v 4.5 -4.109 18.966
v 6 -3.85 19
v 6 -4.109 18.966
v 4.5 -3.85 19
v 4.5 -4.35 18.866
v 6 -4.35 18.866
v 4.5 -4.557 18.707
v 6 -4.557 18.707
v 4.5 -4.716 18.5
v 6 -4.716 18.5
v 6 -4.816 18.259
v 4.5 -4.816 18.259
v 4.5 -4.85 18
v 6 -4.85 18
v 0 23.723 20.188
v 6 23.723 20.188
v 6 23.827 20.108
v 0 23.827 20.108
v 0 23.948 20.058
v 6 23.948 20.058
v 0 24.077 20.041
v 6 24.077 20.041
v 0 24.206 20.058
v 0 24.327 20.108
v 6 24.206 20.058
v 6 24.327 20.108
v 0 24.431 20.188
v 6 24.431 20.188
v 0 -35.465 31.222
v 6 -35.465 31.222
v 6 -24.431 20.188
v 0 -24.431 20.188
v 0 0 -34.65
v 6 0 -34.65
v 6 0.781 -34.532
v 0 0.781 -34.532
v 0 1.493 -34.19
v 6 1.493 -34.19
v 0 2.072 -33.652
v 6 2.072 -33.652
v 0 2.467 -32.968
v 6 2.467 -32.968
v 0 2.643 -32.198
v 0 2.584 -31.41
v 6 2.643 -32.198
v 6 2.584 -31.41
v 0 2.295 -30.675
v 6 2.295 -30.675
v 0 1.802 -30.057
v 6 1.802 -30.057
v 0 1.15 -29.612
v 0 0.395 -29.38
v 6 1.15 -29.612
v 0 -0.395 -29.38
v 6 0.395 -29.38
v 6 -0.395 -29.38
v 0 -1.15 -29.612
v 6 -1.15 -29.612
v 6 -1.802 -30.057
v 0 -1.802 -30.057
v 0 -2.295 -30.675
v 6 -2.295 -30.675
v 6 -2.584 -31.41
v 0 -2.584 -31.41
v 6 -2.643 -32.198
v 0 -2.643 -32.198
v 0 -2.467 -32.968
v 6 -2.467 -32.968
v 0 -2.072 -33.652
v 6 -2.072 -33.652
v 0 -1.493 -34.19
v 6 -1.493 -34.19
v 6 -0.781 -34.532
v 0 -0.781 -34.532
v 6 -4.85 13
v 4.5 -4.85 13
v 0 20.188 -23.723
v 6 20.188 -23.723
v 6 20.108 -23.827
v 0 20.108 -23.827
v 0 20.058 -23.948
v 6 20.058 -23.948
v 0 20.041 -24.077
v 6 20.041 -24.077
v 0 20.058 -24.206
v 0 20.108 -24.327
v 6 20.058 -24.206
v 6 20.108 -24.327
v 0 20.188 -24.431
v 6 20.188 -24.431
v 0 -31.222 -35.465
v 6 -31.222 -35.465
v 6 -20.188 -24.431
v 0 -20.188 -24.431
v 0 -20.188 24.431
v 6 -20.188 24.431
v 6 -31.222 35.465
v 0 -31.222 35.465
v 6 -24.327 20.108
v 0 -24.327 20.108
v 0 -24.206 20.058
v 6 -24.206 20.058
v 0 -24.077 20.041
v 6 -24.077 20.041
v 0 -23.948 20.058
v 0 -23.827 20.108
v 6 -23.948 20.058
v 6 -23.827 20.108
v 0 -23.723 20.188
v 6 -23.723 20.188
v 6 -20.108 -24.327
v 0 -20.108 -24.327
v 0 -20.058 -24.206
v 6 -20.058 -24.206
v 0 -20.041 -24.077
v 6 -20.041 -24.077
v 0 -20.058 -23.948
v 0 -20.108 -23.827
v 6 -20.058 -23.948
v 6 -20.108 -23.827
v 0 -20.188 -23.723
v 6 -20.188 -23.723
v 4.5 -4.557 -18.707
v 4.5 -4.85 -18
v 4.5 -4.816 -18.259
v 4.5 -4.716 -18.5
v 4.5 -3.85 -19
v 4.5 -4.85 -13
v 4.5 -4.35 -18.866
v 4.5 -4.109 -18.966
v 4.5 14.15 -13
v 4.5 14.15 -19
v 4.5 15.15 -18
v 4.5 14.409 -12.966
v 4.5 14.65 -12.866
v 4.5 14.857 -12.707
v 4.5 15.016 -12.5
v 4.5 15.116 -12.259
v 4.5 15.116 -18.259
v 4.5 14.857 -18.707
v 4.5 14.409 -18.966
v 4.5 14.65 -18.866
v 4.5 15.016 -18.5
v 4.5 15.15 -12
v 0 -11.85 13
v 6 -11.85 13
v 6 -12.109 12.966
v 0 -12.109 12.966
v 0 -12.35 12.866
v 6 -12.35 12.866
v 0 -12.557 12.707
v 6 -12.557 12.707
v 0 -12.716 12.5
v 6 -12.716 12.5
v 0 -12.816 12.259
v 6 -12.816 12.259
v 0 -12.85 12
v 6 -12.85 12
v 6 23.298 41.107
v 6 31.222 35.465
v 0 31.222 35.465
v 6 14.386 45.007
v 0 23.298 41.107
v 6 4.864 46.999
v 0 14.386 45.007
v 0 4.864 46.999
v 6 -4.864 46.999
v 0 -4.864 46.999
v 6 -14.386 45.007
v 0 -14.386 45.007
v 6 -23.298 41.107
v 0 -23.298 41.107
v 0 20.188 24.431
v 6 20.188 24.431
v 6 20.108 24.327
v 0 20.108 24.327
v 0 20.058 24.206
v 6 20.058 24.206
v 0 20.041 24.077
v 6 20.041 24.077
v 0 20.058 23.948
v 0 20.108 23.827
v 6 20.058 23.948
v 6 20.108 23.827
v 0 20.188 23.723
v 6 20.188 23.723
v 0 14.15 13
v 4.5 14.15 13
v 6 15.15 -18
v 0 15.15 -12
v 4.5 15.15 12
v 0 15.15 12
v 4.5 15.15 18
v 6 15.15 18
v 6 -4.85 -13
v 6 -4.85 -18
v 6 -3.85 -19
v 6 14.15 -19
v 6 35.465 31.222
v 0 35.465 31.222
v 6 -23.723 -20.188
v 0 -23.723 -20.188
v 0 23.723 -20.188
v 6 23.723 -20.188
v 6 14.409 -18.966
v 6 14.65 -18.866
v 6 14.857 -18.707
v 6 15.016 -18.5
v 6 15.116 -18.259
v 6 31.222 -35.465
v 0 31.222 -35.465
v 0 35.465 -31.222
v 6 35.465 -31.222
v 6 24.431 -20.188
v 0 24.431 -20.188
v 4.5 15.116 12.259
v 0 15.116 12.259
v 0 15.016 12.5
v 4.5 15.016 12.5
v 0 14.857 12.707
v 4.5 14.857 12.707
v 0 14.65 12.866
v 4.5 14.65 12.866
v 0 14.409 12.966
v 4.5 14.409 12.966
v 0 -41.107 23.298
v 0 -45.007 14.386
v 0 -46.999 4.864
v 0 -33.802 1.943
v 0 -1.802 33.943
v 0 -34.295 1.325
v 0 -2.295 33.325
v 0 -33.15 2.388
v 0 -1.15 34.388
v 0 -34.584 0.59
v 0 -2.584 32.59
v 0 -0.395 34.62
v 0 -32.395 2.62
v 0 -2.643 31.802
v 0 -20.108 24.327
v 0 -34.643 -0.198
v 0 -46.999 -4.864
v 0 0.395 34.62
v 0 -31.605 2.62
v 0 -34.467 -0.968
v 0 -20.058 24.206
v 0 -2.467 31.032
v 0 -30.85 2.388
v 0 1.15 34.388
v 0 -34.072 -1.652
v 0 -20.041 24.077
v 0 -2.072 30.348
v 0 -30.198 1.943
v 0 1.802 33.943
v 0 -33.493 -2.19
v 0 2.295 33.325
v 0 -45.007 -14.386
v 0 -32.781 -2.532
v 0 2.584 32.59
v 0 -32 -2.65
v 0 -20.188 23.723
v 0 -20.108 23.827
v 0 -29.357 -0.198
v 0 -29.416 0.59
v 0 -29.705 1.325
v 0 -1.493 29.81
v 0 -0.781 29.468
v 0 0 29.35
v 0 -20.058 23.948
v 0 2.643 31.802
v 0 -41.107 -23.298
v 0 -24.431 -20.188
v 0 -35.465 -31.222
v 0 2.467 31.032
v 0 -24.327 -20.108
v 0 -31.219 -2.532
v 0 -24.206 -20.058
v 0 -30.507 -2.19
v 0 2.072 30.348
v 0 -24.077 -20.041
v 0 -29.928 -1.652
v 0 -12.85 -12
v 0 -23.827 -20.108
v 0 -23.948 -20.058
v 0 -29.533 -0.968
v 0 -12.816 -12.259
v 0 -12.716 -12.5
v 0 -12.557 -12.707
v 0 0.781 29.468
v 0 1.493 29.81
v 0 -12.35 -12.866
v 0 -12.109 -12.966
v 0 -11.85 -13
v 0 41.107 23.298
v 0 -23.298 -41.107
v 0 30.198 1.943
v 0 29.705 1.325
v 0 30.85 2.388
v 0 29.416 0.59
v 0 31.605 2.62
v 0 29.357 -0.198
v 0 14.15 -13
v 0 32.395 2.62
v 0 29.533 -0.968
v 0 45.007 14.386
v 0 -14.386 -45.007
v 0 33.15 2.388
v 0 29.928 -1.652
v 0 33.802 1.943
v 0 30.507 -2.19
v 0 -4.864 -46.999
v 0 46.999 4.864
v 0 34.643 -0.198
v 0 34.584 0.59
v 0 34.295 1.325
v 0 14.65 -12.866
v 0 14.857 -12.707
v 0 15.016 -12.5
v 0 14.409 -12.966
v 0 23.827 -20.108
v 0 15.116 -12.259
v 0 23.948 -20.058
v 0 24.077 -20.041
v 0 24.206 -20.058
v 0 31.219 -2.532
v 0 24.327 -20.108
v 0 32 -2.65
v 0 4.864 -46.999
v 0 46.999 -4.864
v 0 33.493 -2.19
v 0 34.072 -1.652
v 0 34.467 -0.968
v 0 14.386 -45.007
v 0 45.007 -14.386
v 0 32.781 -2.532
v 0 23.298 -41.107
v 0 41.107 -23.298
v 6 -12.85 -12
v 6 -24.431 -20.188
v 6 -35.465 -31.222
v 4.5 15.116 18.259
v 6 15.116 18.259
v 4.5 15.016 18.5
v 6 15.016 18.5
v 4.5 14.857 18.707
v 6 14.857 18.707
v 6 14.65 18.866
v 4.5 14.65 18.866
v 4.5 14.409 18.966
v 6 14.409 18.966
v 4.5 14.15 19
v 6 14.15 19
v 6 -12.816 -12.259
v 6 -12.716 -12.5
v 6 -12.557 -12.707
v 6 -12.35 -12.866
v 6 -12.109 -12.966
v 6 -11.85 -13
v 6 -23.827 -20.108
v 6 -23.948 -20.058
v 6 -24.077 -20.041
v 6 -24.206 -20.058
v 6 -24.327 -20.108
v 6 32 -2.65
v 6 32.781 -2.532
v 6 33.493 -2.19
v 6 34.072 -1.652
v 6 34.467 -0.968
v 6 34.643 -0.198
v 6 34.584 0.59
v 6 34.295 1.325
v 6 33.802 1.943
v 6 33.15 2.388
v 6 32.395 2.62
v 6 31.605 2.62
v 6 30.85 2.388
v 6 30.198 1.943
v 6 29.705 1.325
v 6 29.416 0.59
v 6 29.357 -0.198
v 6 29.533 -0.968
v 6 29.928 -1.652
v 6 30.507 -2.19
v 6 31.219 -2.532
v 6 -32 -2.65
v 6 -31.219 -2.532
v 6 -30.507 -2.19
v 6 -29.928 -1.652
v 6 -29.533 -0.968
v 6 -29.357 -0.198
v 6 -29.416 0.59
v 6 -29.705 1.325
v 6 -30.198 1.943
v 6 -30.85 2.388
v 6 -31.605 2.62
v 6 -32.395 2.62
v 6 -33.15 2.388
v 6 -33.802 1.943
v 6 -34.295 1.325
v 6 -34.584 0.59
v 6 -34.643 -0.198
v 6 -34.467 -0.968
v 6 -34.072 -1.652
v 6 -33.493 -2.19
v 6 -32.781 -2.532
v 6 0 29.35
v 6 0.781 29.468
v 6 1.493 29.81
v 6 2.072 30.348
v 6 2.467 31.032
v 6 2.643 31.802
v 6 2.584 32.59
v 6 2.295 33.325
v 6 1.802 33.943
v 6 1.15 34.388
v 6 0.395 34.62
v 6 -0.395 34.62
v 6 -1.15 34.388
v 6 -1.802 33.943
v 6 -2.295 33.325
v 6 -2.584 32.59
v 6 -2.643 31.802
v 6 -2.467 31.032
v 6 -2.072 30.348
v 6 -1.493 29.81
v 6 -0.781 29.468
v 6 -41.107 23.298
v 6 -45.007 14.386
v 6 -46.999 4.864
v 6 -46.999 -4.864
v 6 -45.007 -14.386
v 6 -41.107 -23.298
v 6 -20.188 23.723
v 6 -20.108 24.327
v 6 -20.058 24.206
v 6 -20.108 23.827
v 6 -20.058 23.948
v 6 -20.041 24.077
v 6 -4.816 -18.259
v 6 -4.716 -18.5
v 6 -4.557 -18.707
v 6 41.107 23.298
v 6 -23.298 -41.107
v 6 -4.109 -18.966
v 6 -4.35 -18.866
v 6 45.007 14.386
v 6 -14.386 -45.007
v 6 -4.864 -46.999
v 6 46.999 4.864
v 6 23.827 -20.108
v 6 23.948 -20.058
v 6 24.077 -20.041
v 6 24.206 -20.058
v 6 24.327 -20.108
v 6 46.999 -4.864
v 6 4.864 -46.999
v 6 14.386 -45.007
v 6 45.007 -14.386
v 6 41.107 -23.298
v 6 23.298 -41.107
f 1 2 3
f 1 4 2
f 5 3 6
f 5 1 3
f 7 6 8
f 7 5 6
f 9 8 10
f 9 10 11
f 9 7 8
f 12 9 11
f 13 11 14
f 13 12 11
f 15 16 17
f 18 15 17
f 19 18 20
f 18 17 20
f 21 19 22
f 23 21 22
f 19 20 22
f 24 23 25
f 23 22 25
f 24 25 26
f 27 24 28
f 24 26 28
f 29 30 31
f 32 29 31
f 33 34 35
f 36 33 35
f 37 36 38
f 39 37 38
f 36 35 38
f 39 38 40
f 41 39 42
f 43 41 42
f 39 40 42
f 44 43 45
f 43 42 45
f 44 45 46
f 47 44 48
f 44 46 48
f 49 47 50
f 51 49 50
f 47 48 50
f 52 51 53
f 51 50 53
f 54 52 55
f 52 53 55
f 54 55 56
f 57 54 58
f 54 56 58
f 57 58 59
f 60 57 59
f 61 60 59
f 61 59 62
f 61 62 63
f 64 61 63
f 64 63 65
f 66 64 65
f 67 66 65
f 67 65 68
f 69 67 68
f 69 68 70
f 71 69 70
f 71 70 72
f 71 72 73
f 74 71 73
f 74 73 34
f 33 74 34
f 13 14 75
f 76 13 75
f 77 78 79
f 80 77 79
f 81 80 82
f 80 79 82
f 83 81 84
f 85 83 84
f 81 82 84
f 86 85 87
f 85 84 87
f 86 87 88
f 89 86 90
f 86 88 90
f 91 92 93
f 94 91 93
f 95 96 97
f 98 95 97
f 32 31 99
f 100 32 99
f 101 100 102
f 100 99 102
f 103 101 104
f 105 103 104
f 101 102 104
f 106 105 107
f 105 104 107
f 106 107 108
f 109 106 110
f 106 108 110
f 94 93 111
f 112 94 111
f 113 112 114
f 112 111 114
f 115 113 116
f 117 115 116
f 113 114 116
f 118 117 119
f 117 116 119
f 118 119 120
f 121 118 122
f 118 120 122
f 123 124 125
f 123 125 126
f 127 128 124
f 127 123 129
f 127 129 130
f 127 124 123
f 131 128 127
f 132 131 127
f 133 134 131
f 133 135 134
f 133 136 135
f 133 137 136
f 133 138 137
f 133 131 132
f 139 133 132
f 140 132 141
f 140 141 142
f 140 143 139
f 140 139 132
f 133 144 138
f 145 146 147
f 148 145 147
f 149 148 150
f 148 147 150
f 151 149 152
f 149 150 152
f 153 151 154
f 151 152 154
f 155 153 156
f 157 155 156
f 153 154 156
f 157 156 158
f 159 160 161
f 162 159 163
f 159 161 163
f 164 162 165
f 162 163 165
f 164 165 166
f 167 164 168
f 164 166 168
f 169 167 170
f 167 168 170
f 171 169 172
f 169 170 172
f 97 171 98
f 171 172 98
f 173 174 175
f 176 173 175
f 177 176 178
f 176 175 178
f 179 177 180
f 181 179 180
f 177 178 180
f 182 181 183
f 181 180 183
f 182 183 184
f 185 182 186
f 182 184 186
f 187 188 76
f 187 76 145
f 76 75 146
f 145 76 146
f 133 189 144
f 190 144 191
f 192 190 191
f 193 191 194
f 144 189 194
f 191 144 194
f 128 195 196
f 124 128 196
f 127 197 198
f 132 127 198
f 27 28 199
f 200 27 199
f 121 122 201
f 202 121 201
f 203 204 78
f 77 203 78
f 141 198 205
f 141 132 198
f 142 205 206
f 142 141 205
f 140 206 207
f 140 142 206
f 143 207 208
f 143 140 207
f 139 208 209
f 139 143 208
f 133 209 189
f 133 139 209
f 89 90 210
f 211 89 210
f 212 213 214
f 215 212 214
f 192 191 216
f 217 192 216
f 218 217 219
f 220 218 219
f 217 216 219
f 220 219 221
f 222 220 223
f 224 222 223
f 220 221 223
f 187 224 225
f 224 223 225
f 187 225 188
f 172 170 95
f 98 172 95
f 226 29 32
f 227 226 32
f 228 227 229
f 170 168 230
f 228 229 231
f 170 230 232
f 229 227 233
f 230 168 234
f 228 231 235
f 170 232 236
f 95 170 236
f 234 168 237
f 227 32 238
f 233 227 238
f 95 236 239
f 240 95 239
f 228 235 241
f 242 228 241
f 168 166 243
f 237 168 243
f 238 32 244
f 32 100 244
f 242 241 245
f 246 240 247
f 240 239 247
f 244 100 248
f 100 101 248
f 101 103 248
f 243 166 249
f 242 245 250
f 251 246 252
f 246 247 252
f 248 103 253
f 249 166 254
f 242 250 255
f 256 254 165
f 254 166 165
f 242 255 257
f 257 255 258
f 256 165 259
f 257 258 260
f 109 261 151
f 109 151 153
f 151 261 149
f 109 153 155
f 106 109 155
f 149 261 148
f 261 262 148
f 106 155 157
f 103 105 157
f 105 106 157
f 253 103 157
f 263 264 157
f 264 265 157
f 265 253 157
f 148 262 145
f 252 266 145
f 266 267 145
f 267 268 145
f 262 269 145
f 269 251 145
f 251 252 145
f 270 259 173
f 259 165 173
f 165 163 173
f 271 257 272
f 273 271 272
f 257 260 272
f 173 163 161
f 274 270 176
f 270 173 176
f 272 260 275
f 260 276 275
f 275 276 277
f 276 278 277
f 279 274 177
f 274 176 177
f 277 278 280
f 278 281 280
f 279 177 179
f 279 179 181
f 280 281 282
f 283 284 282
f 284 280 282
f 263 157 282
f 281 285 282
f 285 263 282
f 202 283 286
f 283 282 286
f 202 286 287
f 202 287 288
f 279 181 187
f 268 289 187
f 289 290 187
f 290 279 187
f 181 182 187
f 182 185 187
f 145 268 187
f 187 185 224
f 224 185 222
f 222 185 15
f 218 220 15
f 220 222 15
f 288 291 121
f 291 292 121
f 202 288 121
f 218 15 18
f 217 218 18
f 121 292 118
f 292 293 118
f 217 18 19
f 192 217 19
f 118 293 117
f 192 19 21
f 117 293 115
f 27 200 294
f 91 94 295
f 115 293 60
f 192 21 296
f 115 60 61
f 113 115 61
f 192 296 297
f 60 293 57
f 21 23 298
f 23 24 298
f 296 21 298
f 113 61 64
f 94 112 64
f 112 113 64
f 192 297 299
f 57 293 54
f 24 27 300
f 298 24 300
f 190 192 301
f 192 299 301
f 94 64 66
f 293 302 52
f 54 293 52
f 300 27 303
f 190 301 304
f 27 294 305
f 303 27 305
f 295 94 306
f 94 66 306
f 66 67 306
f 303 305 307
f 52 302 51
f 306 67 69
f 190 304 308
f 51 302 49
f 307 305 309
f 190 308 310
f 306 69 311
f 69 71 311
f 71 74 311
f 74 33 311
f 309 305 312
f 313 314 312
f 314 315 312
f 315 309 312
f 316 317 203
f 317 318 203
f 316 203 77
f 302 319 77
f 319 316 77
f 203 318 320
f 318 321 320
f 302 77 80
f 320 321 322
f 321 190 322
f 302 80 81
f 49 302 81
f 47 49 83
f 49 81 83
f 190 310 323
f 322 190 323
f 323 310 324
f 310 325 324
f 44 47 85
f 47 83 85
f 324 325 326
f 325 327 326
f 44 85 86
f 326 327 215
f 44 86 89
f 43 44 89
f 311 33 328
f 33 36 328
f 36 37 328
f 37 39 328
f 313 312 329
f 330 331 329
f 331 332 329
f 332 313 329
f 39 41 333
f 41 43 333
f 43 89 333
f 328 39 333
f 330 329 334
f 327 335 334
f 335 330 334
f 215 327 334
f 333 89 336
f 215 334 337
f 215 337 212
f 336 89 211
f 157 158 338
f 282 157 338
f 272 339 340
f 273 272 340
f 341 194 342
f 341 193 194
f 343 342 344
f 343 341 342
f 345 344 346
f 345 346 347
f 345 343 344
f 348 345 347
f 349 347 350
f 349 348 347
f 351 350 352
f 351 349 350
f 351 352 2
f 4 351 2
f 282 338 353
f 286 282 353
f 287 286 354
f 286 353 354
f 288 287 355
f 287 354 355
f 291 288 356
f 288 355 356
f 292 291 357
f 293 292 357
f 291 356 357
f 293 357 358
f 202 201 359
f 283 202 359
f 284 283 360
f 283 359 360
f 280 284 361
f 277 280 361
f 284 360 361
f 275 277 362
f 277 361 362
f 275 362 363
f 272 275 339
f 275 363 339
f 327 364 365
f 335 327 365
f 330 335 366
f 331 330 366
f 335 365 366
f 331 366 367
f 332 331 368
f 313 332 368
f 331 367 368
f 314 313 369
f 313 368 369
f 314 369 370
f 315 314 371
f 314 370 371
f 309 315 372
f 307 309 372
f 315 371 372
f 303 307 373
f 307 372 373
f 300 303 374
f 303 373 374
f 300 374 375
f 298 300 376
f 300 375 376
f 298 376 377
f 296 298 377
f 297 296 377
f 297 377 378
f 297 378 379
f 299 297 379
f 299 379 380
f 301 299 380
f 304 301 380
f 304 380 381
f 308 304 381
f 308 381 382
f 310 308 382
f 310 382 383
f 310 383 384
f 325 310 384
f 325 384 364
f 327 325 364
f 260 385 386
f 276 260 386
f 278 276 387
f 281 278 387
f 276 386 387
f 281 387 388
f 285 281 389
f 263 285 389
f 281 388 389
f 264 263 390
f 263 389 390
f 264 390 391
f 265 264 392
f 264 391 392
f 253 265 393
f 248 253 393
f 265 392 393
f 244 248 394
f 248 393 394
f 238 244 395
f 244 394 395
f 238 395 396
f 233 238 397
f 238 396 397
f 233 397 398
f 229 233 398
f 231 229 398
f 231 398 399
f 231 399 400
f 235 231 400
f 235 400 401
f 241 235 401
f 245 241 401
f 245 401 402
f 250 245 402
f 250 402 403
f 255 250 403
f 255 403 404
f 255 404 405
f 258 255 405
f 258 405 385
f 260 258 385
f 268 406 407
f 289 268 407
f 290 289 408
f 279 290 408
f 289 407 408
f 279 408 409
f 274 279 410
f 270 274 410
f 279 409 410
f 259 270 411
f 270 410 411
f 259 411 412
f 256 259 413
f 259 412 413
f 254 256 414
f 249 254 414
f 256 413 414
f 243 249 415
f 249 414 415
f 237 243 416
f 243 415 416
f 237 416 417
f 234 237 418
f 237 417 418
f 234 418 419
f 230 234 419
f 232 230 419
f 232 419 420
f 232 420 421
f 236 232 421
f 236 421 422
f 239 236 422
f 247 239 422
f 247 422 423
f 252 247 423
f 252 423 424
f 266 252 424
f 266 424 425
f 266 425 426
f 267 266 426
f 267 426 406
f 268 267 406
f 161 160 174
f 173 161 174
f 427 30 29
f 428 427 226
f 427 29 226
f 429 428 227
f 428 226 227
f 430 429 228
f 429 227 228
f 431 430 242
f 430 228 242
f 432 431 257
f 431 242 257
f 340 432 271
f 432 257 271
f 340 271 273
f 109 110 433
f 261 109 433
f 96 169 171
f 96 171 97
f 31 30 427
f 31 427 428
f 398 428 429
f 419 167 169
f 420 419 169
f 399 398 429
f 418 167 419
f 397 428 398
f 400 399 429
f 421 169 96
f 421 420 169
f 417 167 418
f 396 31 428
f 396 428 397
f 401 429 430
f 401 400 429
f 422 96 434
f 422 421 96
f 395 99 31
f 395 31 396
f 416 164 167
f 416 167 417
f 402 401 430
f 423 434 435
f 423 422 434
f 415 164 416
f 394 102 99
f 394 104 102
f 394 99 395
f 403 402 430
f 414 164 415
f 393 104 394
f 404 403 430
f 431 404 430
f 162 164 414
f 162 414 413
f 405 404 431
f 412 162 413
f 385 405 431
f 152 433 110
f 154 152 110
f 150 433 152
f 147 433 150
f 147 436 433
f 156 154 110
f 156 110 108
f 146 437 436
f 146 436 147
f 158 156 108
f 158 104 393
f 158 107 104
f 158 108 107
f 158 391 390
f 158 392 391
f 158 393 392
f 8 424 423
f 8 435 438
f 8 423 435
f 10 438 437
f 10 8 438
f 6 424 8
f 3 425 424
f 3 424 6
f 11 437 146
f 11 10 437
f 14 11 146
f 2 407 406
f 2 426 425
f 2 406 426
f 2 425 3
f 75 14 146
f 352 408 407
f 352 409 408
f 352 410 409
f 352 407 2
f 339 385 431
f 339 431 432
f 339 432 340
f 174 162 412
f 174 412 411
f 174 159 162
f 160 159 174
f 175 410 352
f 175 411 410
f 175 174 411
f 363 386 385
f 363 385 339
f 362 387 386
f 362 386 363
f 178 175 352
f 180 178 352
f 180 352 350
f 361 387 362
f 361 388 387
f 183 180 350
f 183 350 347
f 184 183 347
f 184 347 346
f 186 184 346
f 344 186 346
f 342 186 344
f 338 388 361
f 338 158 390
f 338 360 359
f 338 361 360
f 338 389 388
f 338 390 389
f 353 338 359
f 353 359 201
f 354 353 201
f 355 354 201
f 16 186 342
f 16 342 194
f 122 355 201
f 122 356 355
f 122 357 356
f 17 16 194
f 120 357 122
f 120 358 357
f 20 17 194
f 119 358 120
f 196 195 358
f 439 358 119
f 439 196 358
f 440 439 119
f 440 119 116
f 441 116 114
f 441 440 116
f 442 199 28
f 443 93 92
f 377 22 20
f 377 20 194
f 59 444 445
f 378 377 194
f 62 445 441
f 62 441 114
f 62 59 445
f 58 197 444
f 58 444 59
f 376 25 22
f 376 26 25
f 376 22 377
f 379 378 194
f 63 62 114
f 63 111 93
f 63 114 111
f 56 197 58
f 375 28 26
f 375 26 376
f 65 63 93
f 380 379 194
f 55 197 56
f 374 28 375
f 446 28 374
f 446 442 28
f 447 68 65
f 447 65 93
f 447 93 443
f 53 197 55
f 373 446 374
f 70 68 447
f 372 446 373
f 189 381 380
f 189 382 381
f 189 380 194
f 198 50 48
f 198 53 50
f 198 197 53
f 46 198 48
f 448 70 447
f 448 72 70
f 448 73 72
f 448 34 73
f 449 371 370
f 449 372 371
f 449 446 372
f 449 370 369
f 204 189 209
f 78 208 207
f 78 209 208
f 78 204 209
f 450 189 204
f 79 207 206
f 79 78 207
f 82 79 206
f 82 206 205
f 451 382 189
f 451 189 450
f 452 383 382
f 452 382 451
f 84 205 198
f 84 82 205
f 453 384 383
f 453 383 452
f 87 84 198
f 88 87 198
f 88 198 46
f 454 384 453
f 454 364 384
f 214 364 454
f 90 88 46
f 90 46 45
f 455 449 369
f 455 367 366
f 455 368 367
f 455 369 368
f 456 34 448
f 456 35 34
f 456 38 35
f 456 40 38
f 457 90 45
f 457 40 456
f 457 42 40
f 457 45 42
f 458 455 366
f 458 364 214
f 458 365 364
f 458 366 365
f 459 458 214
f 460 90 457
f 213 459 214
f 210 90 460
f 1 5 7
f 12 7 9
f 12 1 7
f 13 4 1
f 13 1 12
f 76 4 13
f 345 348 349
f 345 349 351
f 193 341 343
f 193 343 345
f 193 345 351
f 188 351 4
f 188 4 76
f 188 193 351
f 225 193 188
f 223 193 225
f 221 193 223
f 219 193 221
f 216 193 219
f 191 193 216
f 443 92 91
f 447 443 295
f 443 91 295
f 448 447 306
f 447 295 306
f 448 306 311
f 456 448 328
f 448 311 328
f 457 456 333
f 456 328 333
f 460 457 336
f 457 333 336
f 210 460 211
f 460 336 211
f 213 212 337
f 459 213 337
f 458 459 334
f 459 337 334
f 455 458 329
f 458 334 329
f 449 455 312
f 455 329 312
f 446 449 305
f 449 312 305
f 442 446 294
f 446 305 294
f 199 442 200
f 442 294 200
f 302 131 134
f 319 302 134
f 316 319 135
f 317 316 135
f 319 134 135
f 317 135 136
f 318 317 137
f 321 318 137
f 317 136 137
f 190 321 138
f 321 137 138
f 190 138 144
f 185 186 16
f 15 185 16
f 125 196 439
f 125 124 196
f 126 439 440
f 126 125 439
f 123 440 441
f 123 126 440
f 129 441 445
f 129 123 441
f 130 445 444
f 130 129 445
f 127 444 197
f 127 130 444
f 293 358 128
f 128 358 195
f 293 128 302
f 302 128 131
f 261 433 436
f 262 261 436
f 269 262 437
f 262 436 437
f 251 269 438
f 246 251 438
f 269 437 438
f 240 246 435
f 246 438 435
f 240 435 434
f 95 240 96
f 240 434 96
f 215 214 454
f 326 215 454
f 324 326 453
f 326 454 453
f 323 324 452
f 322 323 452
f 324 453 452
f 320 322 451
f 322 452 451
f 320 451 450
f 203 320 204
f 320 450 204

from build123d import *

# Parameters (mm, degrees)
SKETCH1_R                = 47.25
BOSS_EXTRUDE1_DEPTH      = 6
CUT_EXTRUDE1_DEPTH       = 20
M5_CLEARANCE_HOLE1_D     = 5.3
M5_CLEARANCE_HOLE1_DEPTH = 16
M5_CLEARANCE_HOLE1_TIP   = 1.59228064
SKETCH16_W               = 38
SKETCH16_H               = 20
CUT_EXTRUDE2_DEPTH       = 1.5
FILLET1_R                = 1
CUT_EXTRUDE3_START       = -10
CUT_EXTRUDE3_DEPTH       = 10


with BuildPart() as part:
    # Sketch1 → Boss-Extrude1 (new body)
    with BuildSketch(Plane(origin=(0, 0, 0), x_dir=(0, 0, -1), z_dir=(1, 0, 0))):
        Circle(SKETCH1_R)
    extrude(amount=BOSS_EXTRUDE1_DEPTH)

    # Sketch2 → Cut-Extrude1 (cut)
    with BuildSketch(Plane(origin=(6, 0, 0), x_dir=(0, 0, -1), z_dir=(1, 0, 0))):
        with BuildLine():
            Line((-12, -12.85), (12, -12.85))
            ThreePointArc((12, -12.85), (12.707106781, -12.557106781), (13, -11.85))
            Line((13, -11.85), (13, 14.15))
            ThreePointArc((13, 14.15), (12.707106781, 14.857106781), (12, 15.15))
            Line((12, 15.15), (-12, 15.15))
            ThreePointArc((-12, 15.15), (-12.707106781, 14.857106781), (-13, 14.15))
            Line((-13, 14.15), (-13, -11.85))
            ThreePointArc((-13, -11.85), (-12.707106781, -12.557106781), (-12, -12.85))
        make_face()
    extrude(amount=-CUT_EXTRUDE1_DEPTH, mode=Mode.SUBTRACT)

    # M5 Clearance Hole1
    with Locations(Plane.ZY):
        with Locations((-32, 0), (0, 32), (32, 0), (0, -32)):
            Hole(M5_CLEARANCE_HOLE1_D / 2, depth=M5_CLEARANCE_HOLE1_DEPTH)
            with Locations((0, 0, -(M5_CLEARANCE_HOLE1_DEPTH + M5_CLEARANCE_HOLE1_TIP / 2))):  # 118° drill point
                Cone(0, M5_CLEARANCE_HOLE1_D / 2, M5_CLEARANCE_HOLE1_TIP, mode=Mode.SUBTRACT)

    # Sketch16 → Cut-Extrude2 (cut)
    with BuildSketch(Plane(origin=(6, 0, 0), x_dir=(0, 0, -1), z_dir=(1, 0, 0))):
        with Locations((0, 5.15)):
            Rectangle(SKETCH16_W, SKETCH16_H)
    extrude(amount=-CUT_EXTRUDE2_DEPTH, mode=Mode.SUBTRACT)

    # Fillet1
    fillet1_edges = [part.edges().sort_by_distance(p)[0] for p in [
        (5.25, -4.85, -19),
        (5.25, -4.85, 19),
        (5.25, 15.15, 19),
        (5.25, 15.15, -19),
    ]]
    fillet(fillet1_edges, radius=FILLET1_R)

    # Sketch17 → Cut-Extrude3 (cut)
    with BuildSketch(Plane(origin=(6, 0, 0), x_dir=(0, 0, -1), z_dir=(1, 0, 0)).offset(CUT_EXTRUDE3_START)):
        with BuildLine():
            Line((23.723432509, -20.187898603), (20.187898603, -23.723432509))
            ThreePointArc((20.187898603, -23.723432509), (20.041451993, -24.076985899), (20.187898603, -24.43053929))
            Line((20.187898603, -24.43053929), (31.222063558, -35.464704245))
            ThreePointArc((31.222063558, -35.464704245), (33.410795411, -33.410795411), (35.464704245, -31.222063558))
            Line((35.464704245, -31.222063558), (24.43053929, -20.187898603))
            ThreePointArc((24.43053929, -20.187898603), (24.076985899, -20.041451993), (23.723432509, -20.187898603))
        make_face()
        with BuildLine():
            Line((-20.187898603, -23.723432509), (-23.723432509, -20.187898603))
            ThreePointArc((-23.723432509, -20.187898603), (-24.076985899, -20.041451993), (-24.43053929, -20.187898603))
            Line((-24.43053929, -20.187898603), (-35.464704245, -31.222063558))
            ThreePointArc((-35.464704245, -31.222063558), (-33.410795411, -33.410795411), (-31.222063558, -35.464704245))
            Line((-31.222063558, -35.464704245), (-20.187898603, -24.43053929))
            ThreePointArc((-20.187898603, -24.43053929), (-20.041451993, -24.076985899), (-20.187898603, -23.723432509))
        make_face()
        with BuildLine():
            Line((-23.723432509, 20.187898603), (-20.187898603, 23.723432509))
            ThreePointArc((-20.187898603, 23.723432509), (-20.041451993, 24.076985899), (-20.187898603, 24.43053929))
            Line((-20.187898603, 24.43053929), (-31.222063558, 35.464704245))
            ThreePointArc((-31.222063558, 35.464704245), (-33.410795411, 33.410795411), (-35.464704245, 31.222063558))
            Line((-35.464704245, 31.222063558), (-24.43053929, 20.187898603))
            ThreePointArc((-24.43053929, 20.187898603), (-24.076985899, 20.041451993), (-23.723432509, 20.187898603))
        make_face()
        with BuildLine():
            Line((20.187898603, 23.723432509), (23.723432509, 20.187898603))
            ThreePointArc((23.723432509, 20.187898603), (24.076985899, 20.041451993), (24.43053929, 20.187898603))
            Line((24.43053929, 20.187898603), (35.464704245, 31.222063558))
            ThreePointArc((35.464704245, 31.222063558), (33.410795411, 33.410795411), (31.222063558, 35.464704245))
            Line((31.222063558, 35.464704245), (20.187898603, 24.43053929))
            ThreePointArc((20.187898603, 24.43053929), (20.041451993, 24.076985899), (20.187898603, 23.723432509))
        make_face()
    extrude(amount=CUT_EXTRUDE3_DEPTH, mode=Mode.SUBTRACT)


solid = part.part
